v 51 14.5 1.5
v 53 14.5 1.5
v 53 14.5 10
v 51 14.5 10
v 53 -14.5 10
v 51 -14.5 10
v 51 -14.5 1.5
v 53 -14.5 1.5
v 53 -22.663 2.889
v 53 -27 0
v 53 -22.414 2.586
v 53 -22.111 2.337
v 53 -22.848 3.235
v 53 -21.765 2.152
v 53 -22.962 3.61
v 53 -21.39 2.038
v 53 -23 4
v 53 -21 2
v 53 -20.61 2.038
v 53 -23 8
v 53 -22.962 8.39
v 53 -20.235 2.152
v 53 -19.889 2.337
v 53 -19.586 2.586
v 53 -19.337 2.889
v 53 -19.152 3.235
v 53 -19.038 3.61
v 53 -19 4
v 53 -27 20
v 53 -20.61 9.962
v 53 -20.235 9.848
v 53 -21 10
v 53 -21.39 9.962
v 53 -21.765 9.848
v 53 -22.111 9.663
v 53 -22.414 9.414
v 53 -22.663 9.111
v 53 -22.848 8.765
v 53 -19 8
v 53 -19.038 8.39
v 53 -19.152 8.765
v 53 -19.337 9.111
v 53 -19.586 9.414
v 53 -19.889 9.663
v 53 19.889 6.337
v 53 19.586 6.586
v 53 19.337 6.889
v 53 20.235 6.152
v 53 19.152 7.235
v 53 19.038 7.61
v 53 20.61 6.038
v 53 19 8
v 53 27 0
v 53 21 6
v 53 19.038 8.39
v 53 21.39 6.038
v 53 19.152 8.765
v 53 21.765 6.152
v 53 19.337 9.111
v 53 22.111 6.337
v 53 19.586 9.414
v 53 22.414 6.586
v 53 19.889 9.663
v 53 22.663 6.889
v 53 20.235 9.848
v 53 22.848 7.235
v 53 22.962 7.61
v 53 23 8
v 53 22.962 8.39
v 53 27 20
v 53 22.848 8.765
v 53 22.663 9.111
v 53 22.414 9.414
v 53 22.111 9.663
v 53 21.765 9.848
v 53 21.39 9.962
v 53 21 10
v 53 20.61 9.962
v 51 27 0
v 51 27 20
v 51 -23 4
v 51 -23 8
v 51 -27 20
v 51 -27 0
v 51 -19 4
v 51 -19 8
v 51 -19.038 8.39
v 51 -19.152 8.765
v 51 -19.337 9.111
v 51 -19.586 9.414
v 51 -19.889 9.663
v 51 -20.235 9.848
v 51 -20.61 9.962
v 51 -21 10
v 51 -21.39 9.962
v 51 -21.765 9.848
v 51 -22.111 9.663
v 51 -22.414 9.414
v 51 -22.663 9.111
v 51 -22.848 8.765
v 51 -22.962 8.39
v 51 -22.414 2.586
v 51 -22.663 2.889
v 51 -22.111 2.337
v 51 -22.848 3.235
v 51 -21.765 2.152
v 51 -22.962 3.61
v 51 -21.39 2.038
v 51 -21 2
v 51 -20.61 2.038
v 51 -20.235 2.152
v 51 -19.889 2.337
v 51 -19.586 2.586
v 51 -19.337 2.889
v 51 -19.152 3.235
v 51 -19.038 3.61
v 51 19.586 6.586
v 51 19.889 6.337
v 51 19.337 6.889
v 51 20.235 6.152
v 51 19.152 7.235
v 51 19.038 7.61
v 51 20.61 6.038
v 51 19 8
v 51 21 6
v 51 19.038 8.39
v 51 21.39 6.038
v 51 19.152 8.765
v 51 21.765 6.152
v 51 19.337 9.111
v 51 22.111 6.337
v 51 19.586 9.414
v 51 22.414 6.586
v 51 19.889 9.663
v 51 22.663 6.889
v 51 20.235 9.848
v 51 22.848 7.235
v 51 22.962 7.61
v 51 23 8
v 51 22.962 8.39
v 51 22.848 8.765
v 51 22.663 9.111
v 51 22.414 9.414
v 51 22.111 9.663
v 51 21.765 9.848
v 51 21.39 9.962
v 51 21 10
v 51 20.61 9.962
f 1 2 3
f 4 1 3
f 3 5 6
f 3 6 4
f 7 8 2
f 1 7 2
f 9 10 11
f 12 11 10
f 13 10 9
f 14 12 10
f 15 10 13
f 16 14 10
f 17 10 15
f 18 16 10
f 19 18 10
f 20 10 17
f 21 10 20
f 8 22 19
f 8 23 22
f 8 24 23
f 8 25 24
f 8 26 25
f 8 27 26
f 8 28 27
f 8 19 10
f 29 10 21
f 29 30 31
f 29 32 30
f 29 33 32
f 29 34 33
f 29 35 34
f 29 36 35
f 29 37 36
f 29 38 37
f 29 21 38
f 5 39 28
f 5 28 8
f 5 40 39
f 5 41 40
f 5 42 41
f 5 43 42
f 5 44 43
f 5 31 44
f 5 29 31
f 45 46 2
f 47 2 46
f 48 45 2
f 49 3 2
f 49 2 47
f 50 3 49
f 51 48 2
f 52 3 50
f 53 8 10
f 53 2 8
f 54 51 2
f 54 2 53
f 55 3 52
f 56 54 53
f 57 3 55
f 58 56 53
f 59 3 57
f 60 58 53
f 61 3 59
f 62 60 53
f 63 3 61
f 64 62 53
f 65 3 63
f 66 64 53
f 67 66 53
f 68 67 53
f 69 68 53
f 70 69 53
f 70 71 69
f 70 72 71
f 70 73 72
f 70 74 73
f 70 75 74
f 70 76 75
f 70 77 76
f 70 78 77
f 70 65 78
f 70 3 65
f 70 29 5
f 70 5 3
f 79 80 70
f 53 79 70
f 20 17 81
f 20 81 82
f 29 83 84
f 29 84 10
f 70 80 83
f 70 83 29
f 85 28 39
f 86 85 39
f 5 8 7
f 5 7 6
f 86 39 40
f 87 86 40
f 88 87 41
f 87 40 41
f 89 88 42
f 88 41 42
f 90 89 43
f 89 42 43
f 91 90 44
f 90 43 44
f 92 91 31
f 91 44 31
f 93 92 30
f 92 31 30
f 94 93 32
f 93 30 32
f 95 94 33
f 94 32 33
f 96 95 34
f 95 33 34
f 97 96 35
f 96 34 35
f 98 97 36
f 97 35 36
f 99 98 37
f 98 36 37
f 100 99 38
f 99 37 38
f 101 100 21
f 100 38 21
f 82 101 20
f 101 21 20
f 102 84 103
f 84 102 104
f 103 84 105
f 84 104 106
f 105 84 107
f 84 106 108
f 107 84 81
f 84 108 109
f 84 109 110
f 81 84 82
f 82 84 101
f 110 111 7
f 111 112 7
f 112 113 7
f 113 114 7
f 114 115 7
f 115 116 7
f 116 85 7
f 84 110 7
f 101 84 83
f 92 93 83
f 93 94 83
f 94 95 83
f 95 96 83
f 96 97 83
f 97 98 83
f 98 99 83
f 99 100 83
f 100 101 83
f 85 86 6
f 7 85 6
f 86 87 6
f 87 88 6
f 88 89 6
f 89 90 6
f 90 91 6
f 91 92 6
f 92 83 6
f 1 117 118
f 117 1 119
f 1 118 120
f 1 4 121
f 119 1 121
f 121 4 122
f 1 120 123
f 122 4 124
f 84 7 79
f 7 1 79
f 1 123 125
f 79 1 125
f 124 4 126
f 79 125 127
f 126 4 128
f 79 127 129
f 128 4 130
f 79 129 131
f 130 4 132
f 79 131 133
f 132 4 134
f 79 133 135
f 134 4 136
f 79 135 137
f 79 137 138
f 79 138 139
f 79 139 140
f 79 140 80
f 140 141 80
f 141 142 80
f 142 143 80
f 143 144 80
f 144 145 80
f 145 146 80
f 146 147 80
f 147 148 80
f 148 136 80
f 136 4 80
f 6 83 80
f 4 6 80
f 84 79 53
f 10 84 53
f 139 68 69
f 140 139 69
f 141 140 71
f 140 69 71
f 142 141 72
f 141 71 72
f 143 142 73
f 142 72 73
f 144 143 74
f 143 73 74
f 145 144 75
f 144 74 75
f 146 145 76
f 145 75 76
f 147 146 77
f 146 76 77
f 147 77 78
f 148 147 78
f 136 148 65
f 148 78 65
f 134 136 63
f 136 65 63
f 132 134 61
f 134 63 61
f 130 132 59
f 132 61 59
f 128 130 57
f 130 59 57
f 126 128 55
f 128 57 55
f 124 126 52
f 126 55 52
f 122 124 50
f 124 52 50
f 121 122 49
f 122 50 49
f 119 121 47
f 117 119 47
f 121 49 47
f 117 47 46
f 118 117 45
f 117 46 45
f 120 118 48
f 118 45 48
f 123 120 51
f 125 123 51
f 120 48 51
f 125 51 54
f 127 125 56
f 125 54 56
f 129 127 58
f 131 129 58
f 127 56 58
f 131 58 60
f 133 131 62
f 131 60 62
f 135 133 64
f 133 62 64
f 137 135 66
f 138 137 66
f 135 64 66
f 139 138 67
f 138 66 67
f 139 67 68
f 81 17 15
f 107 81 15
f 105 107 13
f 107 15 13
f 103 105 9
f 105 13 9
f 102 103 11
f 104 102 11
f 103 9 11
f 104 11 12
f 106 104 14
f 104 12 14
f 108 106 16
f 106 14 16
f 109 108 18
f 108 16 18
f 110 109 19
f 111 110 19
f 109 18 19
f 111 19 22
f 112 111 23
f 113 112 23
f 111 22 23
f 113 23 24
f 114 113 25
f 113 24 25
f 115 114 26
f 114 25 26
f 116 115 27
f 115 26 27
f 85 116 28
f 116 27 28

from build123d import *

# Parameters (mm, degrees)
SKETCH021_W     = 2
SKETCH021_H     = 54
PAD012_DEPTH    = 20
POCKET007_DEPTH = 2
SKETCH023_R     = 2
POCKET008_DEPTH = 2
SKETCH024_W     = 29
SKETCH024_H     = 8.5
POCKET009_DEPTH = 2


with BuildPart() as part:
    # Sketch021 → Pad012 (new body)
    with BuildSketch(Plane.XY.offset(20)):
        with Locations((52, 0)):
            Rectangle(SKETCH021_W, SKETCH021_H)
    extrude(amount=-PAD012_DEPTH)

    # Sketch022 (on Face4 of Pad012) → Pocket007 (cut)
    with BuildSketch(Plane.YZ.offset(53)):
        with BuildLine():
            Line((-19, 3.999999), (-19, 8))
            ThreePointArc((-19, 8), (-21, 10), (-23, 7.999999))
            Line((-23, 3.999999), (-23, 7.999999))
            ThreePointArc((-23, 3.999999), (-21, 2), (-19, 3.999999))
        make_face()
    extrude(amount=-POCKET007_DEPTH, mode=Mode.SUBTRACT)

    # Sketch023 (on Face2 of Pocket007) → Pocket008 (cut)
    with BuildSketch(Plane.YZ.offset(53)):
        with Locations((21, 8)):
            Circle(SKETCH023_R)
    extrude(amount=-POCKET008_DEPTH, mode=Mode.SUBTRACT)

    # Sketch024 (on Face2 of Pocket008) → Pocket009 (cut)
    with BuildSketch(Plane.YZ.offset(53)):
        with Locations((0, 5.75)):
            Rectangle(SKETCH024_W, SKETCH024_H)
    extrude(amount=-POCKET009_DEPTH, mode=Mode.SUBTRACT)


solid = part.part
